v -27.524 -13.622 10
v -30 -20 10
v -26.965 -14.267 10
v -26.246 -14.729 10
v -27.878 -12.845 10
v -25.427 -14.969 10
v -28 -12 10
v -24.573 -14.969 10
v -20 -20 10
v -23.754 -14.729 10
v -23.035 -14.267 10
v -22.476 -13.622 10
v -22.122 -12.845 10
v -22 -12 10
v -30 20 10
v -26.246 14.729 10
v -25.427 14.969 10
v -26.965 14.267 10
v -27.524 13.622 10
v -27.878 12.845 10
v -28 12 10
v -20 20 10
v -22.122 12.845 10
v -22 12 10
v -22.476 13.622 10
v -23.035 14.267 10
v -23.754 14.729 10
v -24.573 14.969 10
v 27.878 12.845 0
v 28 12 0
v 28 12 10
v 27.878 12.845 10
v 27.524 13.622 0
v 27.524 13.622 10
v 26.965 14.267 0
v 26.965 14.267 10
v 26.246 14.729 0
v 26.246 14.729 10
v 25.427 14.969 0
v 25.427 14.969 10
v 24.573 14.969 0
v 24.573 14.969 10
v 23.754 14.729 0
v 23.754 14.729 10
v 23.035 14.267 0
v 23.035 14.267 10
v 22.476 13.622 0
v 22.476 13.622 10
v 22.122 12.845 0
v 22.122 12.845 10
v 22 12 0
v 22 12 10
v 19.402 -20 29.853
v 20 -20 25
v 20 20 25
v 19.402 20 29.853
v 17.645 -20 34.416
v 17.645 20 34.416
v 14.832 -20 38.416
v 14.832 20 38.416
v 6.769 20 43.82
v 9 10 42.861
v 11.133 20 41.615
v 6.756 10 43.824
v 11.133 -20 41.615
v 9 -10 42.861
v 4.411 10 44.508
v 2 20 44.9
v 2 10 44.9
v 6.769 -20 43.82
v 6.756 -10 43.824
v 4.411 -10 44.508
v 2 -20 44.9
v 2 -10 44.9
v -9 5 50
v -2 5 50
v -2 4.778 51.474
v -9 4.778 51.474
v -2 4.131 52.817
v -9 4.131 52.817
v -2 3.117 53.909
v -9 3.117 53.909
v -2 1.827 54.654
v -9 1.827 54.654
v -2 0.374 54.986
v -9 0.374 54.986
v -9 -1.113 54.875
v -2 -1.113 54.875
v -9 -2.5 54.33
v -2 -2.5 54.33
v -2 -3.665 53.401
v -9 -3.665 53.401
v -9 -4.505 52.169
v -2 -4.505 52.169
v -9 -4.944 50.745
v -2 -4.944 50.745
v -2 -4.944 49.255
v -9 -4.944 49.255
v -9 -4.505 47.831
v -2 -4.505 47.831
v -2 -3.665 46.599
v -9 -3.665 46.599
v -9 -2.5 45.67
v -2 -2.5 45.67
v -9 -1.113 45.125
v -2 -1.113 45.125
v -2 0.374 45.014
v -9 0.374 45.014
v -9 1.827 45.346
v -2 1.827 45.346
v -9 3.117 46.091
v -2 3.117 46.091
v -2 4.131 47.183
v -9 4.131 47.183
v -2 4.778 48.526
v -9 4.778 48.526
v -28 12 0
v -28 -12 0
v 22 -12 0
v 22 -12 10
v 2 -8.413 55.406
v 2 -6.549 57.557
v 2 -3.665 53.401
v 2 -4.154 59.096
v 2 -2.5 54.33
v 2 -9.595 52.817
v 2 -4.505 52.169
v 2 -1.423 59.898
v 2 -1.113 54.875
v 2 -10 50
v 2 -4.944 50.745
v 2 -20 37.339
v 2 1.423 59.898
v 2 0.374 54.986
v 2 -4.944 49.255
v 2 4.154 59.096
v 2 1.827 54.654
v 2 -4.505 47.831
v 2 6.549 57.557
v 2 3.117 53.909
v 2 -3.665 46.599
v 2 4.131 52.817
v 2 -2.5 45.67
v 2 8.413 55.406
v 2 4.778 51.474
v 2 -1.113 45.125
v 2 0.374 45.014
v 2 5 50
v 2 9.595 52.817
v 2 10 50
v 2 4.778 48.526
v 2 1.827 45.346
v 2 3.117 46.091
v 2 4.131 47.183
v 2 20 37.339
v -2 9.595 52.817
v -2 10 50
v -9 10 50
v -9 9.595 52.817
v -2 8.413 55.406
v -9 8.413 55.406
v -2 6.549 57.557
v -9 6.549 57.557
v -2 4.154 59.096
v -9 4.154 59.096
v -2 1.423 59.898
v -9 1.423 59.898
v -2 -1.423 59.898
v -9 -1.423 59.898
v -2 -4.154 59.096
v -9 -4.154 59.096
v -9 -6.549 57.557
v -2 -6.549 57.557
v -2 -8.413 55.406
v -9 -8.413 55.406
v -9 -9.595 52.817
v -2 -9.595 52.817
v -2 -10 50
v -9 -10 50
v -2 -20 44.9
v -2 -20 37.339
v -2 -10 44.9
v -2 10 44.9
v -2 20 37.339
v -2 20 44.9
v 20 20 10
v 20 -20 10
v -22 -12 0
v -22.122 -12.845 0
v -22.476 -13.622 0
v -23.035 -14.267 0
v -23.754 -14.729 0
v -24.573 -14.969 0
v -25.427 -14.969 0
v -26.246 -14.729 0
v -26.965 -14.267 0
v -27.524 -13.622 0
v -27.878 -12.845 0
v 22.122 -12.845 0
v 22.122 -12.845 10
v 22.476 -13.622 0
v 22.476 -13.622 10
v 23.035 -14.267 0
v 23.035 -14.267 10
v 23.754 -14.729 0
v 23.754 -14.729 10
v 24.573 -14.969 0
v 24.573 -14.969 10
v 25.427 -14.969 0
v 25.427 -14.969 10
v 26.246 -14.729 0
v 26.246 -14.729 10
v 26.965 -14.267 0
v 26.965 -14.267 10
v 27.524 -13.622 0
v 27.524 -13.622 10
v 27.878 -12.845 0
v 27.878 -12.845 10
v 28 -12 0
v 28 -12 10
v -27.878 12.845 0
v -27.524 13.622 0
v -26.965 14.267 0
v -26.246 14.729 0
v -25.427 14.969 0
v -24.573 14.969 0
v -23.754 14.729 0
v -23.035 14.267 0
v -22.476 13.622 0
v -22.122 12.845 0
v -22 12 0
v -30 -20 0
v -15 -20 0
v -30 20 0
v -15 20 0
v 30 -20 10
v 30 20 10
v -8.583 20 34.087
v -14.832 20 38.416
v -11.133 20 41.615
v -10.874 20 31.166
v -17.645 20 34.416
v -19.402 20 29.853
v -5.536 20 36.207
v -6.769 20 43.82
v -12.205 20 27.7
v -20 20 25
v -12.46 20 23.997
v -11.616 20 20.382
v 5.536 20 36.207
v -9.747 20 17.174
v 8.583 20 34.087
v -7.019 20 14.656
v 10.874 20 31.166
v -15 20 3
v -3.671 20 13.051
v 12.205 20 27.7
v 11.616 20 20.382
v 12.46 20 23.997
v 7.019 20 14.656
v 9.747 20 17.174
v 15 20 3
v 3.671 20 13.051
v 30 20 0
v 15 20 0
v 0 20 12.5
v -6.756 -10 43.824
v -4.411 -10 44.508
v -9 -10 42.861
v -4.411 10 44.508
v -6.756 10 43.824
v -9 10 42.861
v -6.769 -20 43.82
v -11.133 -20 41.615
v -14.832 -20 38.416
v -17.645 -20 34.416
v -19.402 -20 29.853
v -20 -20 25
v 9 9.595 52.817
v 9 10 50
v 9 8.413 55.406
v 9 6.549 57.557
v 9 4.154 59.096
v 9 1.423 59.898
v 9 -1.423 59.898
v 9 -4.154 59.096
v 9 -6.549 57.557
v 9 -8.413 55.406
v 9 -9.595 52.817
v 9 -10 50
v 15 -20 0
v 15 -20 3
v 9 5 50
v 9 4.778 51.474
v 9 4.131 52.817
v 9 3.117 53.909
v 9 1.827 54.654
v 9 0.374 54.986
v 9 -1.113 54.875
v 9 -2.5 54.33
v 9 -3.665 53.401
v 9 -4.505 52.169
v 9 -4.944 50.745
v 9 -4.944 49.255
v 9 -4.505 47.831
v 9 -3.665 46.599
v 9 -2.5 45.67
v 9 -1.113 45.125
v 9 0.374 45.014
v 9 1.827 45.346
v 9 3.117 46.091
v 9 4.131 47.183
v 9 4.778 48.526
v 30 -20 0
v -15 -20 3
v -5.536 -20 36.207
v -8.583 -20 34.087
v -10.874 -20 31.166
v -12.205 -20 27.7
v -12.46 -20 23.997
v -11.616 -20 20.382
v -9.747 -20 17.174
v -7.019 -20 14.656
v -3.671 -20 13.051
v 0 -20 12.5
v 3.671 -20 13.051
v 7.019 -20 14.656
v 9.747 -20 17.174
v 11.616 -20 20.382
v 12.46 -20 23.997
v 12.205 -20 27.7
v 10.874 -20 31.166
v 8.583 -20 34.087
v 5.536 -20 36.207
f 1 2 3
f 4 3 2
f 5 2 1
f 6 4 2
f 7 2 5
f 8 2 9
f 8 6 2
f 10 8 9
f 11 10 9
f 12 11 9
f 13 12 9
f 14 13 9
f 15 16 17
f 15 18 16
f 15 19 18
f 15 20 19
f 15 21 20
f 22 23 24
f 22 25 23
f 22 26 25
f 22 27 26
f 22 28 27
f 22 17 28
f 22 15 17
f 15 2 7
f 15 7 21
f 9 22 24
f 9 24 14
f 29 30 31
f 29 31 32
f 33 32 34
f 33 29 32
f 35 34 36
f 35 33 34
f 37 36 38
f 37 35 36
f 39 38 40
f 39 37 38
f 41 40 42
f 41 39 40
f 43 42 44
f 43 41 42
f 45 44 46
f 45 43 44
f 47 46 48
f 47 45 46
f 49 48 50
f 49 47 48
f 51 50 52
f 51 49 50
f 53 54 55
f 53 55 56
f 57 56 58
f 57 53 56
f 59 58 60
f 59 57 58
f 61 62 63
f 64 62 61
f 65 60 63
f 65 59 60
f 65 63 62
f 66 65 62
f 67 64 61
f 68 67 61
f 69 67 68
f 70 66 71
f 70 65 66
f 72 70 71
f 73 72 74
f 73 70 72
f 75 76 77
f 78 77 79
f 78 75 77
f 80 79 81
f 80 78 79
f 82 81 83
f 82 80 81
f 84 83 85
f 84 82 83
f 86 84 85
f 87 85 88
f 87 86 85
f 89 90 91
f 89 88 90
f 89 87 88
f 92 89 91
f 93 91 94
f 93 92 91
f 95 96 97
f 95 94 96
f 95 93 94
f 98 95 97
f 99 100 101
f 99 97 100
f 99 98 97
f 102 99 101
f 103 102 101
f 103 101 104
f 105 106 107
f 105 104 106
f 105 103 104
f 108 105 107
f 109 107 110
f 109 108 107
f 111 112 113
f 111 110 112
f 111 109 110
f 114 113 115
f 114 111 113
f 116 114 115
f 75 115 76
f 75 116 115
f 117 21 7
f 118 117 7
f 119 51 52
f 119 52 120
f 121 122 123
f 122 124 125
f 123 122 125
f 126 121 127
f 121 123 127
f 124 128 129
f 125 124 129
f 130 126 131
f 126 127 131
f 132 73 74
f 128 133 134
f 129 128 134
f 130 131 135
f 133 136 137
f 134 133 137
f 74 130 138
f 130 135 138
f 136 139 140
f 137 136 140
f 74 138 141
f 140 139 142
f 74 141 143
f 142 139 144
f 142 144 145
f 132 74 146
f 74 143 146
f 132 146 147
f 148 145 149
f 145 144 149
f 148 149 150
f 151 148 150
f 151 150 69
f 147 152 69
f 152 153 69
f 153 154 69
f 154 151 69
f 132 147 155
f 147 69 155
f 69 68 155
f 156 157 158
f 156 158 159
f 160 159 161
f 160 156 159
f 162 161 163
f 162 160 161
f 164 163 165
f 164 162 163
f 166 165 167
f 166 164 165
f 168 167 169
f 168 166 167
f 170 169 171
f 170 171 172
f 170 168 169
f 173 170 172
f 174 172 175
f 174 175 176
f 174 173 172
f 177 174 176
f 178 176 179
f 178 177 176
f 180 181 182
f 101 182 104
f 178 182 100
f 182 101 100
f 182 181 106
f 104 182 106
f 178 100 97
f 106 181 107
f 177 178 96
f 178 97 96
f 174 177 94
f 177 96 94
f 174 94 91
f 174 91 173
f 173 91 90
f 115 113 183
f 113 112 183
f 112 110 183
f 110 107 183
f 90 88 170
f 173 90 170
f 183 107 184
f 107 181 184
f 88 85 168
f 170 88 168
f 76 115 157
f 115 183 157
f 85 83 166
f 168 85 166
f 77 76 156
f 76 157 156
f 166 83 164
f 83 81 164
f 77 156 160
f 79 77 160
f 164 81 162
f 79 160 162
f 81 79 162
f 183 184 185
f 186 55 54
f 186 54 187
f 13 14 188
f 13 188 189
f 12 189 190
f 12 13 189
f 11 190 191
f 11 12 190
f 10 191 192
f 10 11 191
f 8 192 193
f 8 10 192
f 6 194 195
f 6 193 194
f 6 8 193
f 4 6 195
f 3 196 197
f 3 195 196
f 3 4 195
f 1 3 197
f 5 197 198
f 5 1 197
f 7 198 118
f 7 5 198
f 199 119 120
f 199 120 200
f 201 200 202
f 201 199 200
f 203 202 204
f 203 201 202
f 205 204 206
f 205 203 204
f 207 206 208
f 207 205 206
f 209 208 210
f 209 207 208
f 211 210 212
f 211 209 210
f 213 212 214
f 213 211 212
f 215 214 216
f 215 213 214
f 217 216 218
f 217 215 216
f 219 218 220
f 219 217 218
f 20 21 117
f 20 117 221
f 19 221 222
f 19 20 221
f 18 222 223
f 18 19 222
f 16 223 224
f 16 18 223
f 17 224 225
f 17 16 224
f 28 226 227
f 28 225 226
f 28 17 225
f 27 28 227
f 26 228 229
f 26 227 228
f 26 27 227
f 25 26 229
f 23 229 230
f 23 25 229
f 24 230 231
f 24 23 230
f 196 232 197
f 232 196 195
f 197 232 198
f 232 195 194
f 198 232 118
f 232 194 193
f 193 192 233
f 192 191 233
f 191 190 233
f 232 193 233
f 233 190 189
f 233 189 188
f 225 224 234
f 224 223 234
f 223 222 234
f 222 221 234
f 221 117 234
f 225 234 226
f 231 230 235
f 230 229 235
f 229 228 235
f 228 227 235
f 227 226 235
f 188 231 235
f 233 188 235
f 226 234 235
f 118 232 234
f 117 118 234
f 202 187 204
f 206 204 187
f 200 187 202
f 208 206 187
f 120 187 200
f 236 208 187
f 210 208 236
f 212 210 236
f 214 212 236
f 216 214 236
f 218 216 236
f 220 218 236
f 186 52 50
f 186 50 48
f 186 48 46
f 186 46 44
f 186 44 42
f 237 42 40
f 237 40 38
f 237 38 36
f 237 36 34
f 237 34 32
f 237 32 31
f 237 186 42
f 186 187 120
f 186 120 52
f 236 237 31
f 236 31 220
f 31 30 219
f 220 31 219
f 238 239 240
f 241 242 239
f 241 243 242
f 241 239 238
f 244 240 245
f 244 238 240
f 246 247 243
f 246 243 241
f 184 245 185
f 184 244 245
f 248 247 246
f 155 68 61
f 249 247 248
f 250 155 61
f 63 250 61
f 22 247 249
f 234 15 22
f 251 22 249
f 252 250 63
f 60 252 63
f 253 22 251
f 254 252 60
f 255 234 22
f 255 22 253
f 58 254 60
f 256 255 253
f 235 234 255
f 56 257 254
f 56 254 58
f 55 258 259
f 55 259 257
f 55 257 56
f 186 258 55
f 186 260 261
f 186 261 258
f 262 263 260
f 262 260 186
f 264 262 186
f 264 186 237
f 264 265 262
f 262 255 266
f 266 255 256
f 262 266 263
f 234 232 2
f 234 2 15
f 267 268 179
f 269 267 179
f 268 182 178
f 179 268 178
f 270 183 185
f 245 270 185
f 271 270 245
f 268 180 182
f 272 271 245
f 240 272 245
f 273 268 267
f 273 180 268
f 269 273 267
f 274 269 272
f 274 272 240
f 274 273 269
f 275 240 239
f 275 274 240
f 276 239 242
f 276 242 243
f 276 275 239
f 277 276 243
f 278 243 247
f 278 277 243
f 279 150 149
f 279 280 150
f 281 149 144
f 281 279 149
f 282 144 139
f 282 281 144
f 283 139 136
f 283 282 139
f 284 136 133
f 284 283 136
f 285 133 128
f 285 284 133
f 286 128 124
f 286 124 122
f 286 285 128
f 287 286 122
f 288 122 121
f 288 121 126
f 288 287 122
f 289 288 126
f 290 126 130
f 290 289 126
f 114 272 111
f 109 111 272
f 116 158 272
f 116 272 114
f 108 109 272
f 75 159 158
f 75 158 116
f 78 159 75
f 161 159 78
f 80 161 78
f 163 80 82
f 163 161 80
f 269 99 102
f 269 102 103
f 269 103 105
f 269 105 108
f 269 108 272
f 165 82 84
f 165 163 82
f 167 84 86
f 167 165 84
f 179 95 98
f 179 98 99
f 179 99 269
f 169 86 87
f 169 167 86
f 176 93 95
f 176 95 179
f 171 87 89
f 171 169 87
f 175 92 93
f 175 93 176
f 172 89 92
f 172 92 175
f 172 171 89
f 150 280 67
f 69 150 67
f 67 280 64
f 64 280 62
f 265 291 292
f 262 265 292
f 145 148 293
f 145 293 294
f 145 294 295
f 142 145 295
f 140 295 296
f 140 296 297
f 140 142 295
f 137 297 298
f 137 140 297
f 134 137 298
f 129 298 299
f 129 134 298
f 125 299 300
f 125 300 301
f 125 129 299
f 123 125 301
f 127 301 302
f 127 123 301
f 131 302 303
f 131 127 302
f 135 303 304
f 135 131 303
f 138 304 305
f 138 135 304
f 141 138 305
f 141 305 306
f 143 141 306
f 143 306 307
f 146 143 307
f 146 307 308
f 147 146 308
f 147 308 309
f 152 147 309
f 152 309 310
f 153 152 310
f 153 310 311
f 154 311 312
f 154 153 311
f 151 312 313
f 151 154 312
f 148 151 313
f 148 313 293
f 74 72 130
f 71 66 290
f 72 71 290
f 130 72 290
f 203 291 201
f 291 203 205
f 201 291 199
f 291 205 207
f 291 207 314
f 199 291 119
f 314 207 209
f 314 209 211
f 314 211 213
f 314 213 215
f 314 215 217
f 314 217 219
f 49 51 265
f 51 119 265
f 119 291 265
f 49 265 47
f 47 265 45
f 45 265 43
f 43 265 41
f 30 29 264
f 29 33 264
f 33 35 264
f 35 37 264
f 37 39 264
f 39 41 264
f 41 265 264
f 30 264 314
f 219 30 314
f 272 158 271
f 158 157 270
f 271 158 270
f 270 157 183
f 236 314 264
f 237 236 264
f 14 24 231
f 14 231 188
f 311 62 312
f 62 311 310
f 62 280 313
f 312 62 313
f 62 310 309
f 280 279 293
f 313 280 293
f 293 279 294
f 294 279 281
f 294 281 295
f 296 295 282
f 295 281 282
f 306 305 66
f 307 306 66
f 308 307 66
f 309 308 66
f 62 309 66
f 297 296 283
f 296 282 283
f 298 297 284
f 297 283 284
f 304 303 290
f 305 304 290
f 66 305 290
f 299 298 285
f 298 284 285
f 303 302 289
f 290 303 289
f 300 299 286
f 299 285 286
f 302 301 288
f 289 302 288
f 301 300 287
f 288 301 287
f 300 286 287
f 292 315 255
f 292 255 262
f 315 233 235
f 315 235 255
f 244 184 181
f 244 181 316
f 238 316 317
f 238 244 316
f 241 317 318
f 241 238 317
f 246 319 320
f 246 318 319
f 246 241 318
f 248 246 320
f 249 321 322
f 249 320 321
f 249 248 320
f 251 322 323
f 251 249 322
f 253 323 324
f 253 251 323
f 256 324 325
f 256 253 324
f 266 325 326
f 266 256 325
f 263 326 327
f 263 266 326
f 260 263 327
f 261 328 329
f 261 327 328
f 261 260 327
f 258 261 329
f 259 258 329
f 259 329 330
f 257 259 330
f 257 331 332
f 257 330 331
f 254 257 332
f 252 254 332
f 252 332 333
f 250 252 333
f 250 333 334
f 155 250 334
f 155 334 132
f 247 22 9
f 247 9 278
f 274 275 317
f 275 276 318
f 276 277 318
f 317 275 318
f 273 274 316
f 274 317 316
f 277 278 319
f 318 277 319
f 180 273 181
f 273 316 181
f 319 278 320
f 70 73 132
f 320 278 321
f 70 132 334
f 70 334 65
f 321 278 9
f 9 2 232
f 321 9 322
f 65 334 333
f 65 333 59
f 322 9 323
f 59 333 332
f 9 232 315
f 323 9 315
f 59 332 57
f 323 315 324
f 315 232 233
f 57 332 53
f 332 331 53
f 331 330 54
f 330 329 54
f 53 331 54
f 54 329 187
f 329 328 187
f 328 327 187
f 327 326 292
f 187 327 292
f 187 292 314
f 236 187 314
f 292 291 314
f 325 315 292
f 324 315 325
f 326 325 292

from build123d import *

# Parameters (mm, degrees)
SKETCH_W             = 60
SKETCH_H             = 40
PAD_DEPTH            = 10
PAD001_DEPTH         = 20
SKETCH002_R          = 5
PAD002_DEPTH         = 9
POCKET_DEPTH         = 20.001
POCKET_DEPTH_BACK    = 20.001
SKETCH004_W          = 30
SKETCH004_H          = 3
POCKET001_DEPTH      = 20.001
POCKET001_DEPTH_BACK = 20.001
POCKET002_DEPTH      = 187.61763
POCKET002_DEPTH_BACK = 247.61763


with BuildPart() as part:
    # Sketch → Pad (new body)
    with BuildSketch(Plane.XY):
        Rectangle(SKETCH_W, SKETCH_H)
    extrude(amount=PAD_DEPTH)

    # Sketch001 → Pad001 (join, symmetric)
    with BuildSketch(Plane.XZ):
        with BuildLine():
            Line((-20, 10), (-20, 25))
            ThreePointArc((20, 25), (0, 45), (-20, 25))
            Line((20, 25), (20, 10))
            Line((-20, 10), (20, 10))
        make_face()
    extrude(amount=PAD001_DEPTH, both=True)

    # Sketch002 → Pad002 (join, symmetric)
    with BuildSketch(Plane.YZ):
        with BuildLine():
            Line((-10, 29.999977), (-10, 50))
            ThreePointArc((10, 49.999977), (1.1e-05, 60), (-10, 50))
            Line((10, 49.999977), (10, 29.999977))
            Line((10, 29.999977), (-10, 29.999977))
        make_face()
        with Locations((0, 50)):
            Circle(SKETCH002_R, mode=Mode.SUBTRACT)
    extrude(amount=PAD002_DEPTH, both=True)

    # Sketch003 → Pocket (cut, two sides)
    with BuildSketch(Plane.XZ) as pocket_sk:
        with BuildLine():
            ThreePointArc((-2, 37.338963), (0, 12.5), (2, 37.338963))
            Line((2, 70.818963), (2, 37.338963))
            Line((-2, 70.818963), (2, 70.818963))
            Line((-2, 37.338963), (-2, 70.818963))
        make_face()
    extrude(amount=-POCKET_DEPTH, mode=Mode.SUBTRACT)
    extrude(pocket_sk.sketch, amount=POCKET_DEPTH_BACK, mode=Mode.SUBTRACT)

    # Sketch004 → Pocket001 (cut, two sides)
    with BuildSketch(Plane.XZ) as pocket001_sk:
        with Locations((0, 1.5)):
            Rectangle(SKETCH004_W, SKETCH004_H)
    extrude(amount=-POCKET001_DEPTH, mode=Mode.SUBTRACT)
    extrude(pocket001_sk.sketch, amount=POCKET001_DEPTH_BACK, mode=Mode.SUBTRACT)

    # Sketch005 → Pocket002 (cut, two sides)
    with BuildSketch(Plane.XY) as pocket002_sk:
        with BuildLine():
            ThreePointArc((28, 12), (25, 15), (22, 12))
            Line((22, 12), (22, -12))
            ThreePointArc((22, -12), (25, -15), (28, -12))
            Line((28, 12), (28, -12))
        make_face()
    pocket002 = extrude(amount=-POCKET002_DEPTH, mode=Mode.SUBTRACT) + extrude(pocket002_sk.sketch, amount=POCKET002_DEPTH_BACK, mode=Mode.SUBTRACT)

    # Mirrored: Pocket002 across Sketch005 V_Axis
    add(pocket002.mirror(Plane(origin=(0, 0, 0), x_dir=(0, 0, 1), z_dir=(1, 0, 0))), mode=Mode.SUBTRACT)


solid = part.part
